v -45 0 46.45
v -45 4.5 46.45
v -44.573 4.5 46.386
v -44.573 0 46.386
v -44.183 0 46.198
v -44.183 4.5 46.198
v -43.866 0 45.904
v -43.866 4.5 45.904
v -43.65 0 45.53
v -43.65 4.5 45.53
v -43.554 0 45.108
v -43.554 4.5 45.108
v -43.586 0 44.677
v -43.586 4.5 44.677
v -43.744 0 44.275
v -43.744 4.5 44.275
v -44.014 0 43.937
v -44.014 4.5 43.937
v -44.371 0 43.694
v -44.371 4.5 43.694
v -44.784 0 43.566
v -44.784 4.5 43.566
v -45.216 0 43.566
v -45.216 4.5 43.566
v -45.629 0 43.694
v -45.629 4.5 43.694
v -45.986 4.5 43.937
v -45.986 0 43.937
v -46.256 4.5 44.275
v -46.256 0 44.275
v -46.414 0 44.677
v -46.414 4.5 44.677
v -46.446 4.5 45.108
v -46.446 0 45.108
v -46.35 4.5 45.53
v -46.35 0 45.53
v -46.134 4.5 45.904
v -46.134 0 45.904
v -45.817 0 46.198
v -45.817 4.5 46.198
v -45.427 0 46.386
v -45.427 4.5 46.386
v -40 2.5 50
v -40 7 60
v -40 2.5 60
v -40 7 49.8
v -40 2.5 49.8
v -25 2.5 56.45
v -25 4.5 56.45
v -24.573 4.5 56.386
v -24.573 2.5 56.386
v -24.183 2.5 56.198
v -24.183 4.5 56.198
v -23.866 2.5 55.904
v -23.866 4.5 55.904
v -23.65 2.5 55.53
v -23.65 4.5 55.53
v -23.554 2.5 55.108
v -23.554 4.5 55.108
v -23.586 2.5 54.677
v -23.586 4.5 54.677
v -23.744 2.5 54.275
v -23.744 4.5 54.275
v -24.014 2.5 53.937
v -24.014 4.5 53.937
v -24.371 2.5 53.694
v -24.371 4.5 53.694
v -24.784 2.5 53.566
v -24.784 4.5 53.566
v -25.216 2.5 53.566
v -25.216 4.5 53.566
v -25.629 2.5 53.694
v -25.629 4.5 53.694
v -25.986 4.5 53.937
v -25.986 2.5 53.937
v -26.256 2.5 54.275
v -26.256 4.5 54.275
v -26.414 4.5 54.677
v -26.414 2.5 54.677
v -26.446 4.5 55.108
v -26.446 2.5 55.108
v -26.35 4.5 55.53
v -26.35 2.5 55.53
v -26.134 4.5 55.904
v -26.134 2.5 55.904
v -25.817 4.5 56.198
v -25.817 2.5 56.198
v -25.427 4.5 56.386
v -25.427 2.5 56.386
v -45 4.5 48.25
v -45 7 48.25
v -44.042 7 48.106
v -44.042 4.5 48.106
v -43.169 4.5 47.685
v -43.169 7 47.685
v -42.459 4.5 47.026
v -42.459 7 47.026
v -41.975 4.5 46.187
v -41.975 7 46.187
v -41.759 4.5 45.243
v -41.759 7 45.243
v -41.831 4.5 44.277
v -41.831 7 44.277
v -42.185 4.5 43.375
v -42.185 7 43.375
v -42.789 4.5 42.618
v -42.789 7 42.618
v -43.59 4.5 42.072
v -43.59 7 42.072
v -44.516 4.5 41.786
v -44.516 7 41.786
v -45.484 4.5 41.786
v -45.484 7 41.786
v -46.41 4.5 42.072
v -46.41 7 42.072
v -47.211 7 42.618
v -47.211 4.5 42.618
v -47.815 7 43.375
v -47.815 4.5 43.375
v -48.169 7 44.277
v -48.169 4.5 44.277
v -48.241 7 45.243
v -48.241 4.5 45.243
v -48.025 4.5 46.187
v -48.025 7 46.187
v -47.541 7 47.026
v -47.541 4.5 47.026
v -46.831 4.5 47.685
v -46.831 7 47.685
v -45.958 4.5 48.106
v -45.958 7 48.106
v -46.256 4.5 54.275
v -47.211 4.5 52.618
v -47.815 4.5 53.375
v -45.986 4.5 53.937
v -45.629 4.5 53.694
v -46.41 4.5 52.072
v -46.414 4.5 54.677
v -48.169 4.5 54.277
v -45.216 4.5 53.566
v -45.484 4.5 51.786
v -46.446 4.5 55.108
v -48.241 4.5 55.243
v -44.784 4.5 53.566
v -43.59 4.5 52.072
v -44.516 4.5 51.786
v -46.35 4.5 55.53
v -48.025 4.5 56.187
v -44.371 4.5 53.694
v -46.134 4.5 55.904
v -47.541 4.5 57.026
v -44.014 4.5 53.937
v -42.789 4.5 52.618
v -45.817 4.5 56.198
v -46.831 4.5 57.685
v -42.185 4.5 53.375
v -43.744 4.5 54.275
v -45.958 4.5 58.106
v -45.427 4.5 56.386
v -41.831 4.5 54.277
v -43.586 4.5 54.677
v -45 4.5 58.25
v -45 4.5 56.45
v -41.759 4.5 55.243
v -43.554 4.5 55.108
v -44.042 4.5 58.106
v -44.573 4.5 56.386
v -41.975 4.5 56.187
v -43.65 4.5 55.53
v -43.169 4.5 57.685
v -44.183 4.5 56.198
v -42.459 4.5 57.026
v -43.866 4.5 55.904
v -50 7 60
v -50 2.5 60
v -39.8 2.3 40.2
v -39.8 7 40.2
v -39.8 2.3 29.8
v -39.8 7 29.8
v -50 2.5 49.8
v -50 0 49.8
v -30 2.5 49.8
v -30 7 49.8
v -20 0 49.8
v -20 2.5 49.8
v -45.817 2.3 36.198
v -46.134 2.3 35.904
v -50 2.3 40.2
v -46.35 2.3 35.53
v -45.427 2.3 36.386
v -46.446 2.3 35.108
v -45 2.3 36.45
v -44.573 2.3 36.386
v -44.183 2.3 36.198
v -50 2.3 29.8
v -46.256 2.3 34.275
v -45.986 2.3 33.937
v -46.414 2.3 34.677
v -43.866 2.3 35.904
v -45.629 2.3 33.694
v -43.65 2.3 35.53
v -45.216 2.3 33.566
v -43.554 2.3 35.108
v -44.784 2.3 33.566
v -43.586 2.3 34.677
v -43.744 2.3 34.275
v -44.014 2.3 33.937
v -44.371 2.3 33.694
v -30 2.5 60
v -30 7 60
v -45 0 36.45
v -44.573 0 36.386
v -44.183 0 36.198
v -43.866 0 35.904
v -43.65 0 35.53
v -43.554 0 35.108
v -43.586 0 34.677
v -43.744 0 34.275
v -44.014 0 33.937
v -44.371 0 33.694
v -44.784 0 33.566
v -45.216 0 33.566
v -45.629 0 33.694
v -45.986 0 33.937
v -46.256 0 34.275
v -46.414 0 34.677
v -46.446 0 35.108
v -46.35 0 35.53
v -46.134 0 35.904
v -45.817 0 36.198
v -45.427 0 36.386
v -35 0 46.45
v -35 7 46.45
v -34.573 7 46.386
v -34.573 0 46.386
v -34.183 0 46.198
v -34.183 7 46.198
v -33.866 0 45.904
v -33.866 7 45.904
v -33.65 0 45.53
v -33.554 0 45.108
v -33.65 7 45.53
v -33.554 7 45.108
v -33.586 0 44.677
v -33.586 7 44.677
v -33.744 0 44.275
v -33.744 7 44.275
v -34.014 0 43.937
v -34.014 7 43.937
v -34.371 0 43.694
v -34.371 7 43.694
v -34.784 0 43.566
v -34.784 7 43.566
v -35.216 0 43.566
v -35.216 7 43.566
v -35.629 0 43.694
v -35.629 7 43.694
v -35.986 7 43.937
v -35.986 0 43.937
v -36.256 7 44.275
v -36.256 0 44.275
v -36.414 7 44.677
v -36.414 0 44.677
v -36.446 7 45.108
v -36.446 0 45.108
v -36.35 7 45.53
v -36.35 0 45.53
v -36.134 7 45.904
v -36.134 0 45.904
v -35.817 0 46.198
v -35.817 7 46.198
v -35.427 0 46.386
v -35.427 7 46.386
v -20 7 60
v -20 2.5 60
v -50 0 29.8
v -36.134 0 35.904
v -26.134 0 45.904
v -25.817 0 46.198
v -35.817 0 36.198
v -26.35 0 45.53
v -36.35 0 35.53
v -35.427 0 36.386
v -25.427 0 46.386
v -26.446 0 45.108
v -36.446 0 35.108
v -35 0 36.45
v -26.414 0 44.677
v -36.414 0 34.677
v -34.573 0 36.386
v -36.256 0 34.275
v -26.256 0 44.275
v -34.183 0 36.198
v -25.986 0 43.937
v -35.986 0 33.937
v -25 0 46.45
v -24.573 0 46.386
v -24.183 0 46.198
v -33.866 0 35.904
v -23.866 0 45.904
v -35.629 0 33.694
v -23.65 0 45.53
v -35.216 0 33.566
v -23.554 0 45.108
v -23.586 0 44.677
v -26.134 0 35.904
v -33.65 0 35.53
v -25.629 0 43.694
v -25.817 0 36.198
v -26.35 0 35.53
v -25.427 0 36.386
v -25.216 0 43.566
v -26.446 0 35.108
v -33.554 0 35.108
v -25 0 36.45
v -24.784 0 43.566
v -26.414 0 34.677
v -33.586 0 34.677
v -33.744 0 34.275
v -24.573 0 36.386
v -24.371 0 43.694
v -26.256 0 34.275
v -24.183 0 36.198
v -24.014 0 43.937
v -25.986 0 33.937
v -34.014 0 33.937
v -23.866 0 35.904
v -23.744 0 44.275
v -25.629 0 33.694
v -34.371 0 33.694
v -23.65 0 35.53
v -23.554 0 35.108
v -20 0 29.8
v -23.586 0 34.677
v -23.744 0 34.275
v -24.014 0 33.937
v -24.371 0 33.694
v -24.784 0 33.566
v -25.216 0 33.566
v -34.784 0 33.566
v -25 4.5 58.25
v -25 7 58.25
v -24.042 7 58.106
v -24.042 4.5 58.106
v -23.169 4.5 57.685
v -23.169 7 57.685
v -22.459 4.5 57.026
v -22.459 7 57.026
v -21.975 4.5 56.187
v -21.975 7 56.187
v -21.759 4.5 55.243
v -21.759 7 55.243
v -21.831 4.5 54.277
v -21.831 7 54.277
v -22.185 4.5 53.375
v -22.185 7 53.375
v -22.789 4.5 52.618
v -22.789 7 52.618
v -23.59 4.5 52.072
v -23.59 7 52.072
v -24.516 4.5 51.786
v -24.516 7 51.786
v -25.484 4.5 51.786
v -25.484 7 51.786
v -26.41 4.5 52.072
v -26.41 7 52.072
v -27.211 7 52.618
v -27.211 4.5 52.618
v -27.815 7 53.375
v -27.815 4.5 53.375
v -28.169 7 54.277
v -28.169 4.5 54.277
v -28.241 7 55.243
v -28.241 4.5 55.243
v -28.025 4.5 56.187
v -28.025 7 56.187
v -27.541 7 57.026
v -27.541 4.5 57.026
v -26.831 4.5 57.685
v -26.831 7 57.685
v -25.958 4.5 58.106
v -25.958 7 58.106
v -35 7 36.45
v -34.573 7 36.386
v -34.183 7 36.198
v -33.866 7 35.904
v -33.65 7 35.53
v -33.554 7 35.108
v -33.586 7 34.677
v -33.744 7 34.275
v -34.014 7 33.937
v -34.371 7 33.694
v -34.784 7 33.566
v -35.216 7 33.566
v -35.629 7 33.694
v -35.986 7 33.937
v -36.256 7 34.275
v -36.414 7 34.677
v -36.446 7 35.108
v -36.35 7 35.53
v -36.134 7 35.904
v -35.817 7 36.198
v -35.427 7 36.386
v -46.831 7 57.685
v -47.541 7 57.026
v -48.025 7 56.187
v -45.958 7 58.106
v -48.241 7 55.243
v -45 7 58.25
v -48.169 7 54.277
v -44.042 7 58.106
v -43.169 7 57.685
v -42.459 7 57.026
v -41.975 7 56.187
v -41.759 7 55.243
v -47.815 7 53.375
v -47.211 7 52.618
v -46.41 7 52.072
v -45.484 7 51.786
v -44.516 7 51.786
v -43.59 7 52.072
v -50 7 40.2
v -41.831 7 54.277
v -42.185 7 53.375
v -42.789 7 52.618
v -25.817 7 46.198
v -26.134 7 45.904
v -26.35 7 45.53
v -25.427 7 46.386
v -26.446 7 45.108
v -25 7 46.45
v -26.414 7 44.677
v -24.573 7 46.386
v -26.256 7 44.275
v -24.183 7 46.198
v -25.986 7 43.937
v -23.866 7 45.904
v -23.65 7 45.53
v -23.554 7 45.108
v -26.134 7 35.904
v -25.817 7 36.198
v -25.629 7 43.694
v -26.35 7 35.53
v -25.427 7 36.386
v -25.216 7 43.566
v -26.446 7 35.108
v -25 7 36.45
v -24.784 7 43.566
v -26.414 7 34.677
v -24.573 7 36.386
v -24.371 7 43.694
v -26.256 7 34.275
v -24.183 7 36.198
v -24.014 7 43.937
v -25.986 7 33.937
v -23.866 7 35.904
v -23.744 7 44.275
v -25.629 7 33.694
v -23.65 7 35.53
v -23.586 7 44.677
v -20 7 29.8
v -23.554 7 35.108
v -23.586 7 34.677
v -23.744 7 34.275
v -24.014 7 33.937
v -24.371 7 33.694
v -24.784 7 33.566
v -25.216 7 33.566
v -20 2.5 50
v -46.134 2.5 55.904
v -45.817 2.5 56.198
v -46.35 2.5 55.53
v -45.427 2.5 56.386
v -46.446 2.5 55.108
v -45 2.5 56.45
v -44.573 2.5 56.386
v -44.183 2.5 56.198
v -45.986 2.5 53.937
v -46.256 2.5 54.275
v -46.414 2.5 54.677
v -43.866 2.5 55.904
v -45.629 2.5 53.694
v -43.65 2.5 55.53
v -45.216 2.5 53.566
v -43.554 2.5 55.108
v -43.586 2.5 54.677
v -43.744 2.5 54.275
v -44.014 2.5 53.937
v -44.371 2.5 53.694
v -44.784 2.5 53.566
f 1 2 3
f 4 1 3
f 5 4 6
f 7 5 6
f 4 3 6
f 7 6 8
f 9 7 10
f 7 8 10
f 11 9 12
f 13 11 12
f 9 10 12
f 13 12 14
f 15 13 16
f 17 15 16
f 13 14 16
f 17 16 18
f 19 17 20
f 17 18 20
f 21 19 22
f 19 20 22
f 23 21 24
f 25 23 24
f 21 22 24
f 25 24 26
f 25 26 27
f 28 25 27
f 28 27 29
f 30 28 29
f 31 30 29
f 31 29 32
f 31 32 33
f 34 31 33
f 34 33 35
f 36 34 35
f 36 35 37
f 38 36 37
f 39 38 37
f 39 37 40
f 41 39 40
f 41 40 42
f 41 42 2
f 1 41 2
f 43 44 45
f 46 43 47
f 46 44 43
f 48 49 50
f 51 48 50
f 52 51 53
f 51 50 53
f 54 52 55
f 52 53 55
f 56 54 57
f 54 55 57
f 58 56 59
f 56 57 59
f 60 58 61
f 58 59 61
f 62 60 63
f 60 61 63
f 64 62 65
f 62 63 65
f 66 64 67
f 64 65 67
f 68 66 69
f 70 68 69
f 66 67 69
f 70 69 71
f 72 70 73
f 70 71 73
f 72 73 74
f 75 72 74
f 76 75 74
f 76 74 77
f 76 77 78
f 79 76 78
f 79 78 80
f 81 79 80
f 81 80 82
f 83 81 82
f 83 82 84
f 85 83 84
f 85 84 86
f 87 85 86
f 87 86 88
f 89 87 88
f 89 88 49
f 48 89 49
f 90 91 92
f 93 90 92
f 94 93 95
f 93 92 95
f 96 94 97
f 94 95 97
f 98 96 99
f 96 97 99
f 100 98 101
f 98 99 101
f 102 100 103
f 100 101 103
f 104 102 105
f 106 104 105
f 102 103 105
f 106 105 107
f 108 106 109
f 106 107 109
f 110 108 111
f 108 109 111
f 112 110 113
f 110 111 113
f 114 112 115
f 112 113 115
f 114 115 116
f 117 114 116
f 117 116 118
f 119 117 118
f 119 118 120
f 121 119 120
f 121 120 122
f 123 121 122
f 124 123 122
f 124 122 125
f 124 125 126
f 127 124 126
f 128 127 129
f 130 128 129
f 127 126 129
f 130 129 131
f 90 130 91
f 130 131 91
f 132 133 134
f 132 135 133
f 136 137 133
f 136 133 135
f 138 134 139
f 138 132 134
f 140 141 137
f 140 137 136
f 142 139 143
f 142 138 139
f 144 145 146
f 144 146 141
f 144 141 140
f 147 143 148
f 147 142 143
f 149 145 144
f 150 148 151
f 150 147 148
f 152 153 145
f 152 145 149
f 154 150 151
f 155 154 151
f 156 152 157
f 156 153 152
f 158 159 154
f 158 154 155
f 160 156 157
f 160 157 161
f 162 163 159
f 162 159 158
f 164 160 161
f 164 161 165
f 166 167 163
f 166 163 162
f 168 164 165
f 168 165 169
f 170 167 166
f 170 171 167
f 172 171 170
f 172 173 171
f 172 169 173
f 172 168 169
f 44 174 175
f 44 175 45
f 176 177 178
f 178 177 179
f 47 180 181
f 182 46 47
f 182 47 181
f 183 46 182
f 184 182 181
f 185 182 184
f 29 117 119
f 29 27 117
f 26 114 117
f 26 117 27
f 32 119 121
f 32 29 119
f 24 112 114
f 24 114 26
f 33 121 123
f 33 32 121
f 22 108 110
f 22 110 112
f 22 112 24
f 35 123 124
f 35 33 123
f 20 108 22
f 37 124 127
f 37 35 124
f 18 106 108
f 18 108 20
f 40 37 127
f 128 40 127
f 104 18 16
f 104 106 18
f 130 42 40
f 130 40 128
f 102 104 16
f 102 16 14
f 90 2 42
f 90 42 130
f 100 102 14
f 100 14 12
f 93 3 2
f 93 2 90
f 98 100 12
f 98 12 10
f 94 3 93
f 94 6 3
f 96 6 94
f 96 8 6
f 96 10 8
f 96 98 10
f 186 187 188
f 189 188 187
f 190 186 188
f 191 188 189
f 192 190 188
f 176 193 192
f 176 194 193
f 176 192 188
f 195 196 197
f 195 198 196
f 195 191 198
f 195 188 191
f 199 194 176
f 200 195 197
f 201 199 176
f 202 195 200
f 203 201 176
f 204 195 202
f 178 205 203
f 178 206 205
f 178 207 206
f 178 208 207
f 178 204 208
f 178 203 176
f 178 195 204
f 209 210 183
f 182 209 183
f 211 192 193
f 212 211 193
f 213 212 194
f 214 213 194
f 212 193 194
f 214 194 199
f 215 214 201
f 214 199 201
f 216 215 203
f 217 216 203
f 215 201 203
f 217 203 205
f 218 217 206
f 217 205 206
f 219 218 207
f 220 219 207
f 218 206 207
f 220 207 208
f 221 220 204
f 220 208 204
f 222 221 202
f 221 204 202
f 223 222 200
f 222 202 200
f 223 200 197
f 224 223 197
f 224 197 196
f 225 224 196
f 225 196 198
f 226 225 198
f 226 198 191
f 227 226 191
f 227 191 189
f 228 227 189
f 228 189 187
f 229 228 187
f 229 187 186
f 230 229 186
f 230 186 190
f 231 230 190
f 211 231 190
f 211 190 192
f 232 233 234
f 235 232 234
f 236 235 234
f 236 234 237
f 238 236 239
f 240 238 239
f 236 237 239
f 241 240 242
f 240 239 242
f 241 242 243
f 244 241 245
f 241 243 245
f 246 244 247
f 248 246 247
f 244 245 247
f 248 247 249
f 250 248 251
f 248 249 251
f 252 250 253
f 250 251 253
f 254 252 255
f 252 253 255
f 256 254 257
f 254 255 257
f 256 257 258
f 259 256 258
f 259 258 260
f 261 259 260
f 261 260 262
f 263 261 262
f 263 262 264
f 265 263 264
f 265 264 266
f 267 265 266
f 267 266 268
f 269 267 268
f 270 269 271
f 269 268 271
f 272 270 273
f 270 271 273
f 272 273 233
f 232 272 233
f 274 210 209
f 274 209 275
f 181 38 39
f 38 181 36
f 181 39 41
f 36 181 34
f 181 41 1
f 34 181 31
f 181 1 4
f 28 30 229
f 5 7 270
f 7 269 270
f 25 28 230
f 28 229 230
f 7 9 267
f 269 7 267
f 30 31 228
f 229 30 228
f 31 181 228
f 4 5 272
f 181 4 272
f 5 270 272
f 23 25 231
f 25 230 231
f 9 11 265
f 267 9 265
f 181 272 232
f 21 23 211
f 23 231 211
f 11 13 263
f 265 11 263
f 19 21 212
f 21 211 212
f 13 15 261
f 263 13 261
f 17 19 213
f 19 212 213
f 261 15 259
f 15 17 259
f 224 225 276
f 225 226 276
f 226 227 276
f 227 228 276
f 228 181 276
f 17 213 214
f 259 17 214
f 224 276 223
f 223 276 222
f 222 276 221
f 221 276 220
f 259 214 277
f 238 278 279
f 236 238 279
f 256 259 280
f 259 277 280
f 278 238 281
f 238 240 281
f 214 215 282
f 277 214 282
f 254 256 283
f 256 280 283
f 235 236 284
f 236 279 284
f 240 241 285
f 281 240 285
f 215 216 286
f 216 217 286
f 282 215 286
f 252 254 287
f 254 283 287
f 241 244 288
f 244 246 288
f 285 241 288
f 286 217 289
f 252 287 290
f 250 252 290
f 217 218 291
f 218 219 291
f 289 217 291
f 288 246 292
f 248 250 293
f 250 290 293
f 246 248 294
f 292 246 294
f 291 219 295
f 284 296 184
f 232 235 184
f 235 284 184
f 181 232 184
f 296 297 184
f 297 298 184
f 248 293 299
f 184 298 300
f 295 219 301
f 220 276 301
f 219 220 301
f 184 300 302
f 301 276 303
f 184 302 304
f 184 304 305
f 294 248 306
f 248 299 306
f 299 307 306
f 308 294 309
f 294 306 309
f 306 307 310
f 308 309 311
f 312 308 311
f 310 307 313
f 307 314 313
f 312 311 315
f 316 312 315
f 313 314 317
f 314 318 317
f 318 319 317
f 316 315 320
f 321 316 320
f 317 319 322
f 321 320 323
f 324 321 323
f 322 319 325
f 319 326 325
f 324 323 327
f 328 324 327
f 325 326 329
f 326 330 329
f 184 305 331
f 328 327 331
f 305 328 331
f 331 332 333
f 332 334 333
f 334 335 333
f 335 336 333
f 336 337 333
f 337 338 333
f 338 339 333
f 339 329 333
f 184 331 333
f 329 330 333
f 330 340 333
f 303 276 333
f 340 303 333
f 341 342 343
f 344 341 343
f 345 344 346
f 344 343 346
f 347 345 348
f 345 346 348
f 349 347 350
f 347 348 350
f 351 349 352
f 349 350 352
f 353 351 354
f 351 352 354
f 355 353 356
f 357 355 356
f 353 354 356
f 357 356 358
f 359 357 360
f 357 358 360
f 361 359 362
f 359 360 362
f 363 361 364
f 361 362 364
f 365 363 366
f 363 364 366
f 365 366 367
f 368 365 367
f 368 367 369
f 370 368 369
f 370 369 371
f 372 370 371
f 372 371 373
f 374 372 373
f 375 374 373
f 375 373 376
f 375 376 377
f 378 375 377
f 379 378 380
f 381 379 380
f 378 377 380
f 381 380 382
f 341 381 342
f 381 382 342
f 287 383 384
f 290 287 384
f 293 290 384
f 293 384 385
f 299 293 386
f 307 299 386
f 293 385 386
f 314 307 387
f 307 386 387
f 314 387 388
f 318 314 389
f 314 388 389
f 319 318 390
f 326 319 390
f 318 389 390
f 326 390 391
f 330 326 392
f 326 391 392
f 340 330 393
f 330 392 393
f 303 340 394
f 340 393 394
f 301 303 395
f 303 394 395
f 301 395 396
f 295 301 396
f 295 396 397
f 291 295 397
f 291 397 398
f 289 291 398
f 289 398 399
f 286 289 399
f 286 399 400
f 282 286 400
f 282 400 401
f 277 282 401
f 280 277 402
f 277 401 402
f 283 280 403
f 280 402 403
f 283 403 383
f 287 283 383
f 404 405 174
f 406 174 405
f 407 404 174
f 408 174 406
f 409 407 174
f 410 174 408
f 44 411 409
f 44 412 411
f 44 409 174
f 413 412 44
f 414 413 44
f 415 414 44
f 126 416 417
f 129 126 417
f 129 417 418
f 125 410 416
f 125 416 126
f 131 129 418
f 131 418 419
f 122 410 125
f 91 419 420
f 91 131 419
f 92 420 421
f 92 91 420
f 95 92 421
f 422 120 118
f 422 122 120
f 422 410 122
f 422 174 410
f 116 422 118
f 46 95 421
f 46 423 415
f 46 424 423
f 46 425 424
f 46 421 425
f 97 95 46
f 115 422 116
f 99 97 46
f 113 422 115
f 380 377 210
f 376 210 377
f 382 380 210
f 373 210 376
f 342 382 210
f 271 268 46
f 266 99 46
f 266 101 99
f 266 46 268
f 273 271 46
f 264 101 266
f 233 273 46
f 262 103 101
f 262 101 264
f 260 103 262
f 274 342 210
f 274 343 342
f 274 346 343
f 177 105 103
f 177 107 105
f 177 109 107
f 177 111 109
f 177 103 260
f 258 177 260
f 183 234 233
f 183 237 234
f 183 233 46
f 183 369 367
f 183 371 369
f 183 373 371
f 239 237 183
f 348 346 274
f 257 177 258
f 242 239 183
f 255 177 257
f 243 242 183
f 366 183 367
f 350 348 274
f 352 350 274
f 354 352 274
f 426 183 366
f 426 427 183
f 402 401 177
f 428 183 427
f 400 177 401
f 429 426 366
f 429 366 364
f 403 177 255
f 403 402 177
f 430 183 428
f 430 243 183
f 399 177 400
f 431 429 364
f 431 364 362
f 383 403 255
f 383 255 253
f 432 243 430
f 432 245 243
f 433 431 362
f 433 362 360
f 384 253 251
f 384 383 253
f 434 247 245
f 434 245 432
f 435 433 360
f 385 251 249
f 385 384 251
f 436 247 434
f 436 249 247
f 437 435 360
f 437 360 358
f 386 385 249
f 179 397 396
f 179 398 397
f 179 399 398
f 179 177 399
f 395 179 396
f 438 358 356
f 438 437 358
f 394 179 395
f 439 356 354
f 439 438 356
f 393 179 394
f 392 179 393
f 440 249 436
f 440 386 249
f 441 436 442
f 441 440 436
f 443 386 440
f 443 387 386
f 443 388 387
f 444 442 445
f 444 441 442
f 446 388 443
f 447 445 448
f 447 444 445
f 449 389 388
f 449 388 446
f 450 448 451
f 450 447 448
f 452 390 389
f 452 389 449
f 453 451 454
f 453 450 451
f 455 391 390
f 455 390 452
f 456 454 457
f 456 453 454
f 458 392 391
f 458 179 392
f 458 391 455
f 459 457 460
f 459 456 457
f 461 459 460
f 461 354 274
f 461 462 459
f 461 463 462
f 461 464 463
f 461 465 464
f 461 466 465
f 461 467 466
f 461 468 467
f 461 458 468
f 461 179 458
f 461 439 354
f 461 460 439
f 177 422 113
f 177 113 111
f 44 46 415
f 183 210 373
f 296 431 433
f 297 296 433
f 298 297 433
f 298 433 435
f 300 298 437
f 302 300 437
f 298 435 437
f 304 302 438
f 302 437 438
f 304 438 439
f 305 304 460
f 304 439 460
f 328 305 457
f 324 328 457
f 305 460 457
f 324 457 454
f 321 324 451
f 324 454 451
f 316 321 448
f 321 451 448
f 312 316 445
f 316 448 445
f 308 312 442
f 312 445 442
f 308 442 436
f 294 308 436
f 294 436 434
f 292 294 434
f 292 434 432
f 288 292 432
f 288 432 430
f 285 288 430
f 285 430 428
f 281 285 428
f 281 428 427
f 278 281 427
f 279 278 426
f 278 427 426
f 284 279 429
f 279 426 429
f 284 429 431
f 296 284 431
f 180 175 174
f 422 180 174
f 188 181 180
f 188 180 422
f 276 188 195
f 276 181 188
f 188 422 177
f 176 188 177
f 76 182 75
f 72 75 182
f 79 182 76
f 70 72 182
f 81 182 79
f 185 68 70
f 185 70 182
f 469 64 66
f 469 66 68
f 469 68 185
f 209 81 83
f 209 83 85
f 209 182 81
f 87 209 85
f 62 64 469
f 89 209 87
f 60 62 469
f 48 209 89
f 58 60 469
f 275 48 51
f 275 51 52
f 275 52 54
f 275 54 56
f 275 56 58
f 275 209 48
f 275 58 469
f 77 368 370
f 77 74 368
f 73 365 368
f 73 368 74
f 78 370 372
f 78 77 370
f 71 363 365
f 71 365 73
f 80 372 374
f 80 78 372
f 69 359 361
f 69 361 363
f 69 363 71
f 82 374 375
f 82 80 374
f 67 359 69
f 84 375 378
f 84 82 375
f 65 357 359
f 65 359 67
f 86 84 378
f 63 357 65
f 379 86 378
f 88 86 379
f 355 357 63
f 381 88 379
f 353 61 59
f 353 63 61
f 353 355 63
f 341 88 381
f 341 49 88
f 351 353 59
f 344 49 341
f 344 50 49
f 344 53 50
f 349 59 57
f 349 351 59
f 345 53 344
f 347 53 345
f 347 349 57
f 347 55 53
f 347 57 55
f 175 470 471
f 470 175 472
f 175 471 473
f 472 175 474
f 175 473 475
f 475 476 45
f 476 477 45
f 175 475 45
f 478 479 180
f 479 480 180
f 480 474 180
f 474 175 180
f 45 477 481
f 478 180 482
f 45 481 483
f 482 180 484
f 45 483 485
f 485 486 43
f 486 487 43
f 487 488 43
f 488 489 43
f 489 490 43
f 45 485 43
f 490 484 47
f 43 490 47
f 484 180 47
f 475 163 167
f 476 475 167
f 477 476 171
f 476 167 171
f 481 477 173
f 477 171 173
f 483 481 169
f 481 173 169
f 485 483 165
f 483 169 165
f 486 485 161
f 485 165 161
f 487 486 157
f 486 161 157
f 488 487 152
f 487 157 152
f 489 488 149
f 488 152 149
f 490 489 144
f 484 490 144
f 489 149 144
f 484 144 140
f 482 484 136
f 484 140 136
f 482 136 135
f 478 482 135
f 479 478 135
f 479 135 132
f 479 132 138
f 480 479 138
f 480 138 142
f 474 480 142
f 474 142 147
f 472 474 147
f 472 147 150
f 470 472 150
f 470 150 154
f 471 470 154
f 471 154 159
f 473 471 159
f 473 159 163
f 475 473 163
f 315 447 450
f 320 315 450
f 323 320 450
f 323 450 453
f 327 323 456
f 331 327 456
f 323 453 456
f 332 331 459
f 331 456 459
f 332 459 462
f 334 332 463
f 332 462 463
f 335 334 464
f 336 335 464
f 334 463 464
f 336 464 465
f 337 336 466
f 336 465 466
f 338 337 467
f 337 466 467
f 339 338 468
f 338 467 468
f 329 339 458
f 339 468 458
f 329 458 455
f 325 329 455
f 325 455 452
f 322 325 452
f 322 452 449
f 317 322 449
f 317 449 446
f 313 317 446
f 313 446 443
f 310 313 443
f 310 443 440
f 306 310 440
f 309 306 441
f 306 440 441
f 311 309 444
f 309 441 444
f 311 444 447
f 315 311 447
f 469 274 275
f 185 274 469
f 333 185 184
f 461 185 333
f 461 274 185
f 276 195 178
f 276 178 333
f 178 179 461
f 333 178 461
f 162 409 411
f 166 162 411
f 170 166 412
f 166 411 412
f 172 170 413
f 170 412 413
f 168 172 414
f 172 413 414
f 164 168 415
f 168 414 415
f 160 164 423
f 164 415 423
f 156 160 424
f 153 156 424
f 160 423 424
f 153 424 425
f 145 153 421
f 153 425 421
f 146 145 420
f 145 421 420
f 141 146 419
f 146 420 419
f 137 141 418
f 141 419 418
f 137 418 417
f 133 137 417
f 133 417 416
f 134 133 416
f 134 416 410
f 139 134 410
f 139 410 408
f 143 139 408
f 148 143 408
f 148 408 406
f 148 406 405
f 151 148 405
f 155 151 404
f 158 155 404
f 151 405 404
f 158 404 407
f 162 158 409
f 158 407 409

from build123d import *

# Parameters (mm, degrees)
CROQUIS1_W              = 100
CROQUIS1_H              = 100
SALIENTE_EXTRUIR1_DEPTH = 7
CROQUIS2_W              = 10.4
CROQUIS2_H              = 10.4
CORTAR_EXTRUIR1_DEPTH   = 4.7
CROQUIS3_W              = 10
CROQUIS3_H              = 10
SALIENTE_EXTRUIR2_DEPTH = 4.5
CROQUIS4_R              = 1.45
CORTAR_EXTRUIR2_DEPTH   = 7
CROQUIS5_R              = 3.25
CORTAR_EXTRUIR4_DEPTH   = 2.5
CROQUIS6_W              = 10
CROQUIS6_H              = 0.2
CROQUIS6_W_2            = 0.2
CROQUIS6_H_2            = 9.8
CORTAR_EXTRUIR5_DEPTH   = 7
CROQUIS8_W              = 10.2
CROQUIS8_H              = 10
CORTAR_EXTRUIR7_DEPTH   = 7
CROQUIS9_W              = 10.012239445
CROQUIS9_H              = 0.2
CROQUIS9_W_2            = 0.2
CROQUIS9_H_2            = 10.2
CORTAR_EXTRUIR9_DEPTH   = 2.5
CROQUIS10_W             = 0.2
CROQUIS10_H             = 0.2
CORTAR_EXTRUIR11_DEPTH  = 5
CORTAR_EXTRUIR13_DEPTH  = 15


with BuildPart() as part:
    # Croquis1 → Saliente-Extruir1 (new body)
    with BuildSketch(Plane(origin=(0, 0, 0), x_dir=(1, 0, 0), z_dir=(0, 1, 0))):
        Rectangle(CROQUIS1_W, CROQUIS1_H)
    extrude(amount=SALIENTE_EXTRUIR1_DEPTH)

    # Croquis2 → Cortar-Extruir1 (cut)
    with BuildSketch(Plane(origin=(0, 7, 0), x_dir=(1, 0, 0), z_dir=(0, 1, 0))):
        with Locations((-45, 45)):
            Rectangle(CROQUIS2_W, CROQUIS2_H)
        with Locations((-25, 45)):
            Rectangle(CROQUIS2_W, CROQUIS2_H)
        with Locations((-5, 45)):
            Rectangle(CROQUIS2_W, CROQUIS2_H)
        with Locations((15, 45)):
            Rectangle(CROQUIS2_W, CROQUIS2_H)
        with Locations((35, 45)):
            Rectangle(CROQUIS2_W, CROQUIS2_H)
        with Locations((-45, 25)):
            Rectangle(CROQUIS2_W, CROQUIS2_H)
        with Locations((-45, 5)):
            Rectangle(CROQUIS2_W, CROQUIS2_H)
        with Locations((-45, -15)):
            Rectangle(CROQUIS2_W, CROQUIS2_H)
        with Locations((-45, -35)):
            Rectangle(CROQUIS2_W, CROQUIS2_H)
    extrude(amount=-CORTAR_EXTRUIR1_DEPTH, mode=Mode.SUBTRACT)

    # Croquis3 → Saliente-Extruir2 (add)
    with BuildSketch(Plane(origin=(0, 7, 0), x_dir=(1, 0, 0), z_dir=(0, 1, 0))):
        with Locations((55, 25)):
            Rectangle(CROQUIS3_W, CROQUIS3_H)
        with Locations((55, 45)):
            Rectangle(CROQUIS3_W, CROQUIS3_H)
        with Locations((55, 5)):
            Rectangle(CROQUIS3_W, CROQUIS3_H)
        with Locations((55, -15)):
            Rectangle(CROQUIS3_W, CROQUIS3_H)
        with Locations((55, -35)):
            Rectangle(CROQUIS3_W, CROQUIS3_H)
        with Locations((-25, -55)):
            Rectangle(CROQUIS3_W, CROQUIS3_H)
        with Locations((-45, -55)):
            Rectangle(CROQUIS3_W, CROQUIS3_H)
        with Locations((-5, -55)):
            Rectangle(CROQUIS3_W, CROQUIS3_H)
        with Locations((15, -55)):
            Rectangle(CROQUIS3_W, CROQUIS3_H)
        with Locations((35, -55)):
            Rectangle(CROQUIS3_W, CROQUIS3_H)
    extrude(amount=-SALIENTE_EXTRUIR2_DEPTH)

    # Croquis4 → Cortar-Extruir2 (cut)
    with BuildSketch(Plane(origin=(0, 7, 0), x_dir=(1, 0, 0), z_dir=(0, 1, 0))):
        with Locations(Location((-45, 45, 0), (0, 0, 270))):
            Circle(CROQUIS4_R)
        with Locations(Location((-35, 45, 0), (0, 0, 270))):
            Circle(CROQUIS4_R)
        with Locations(Location((-25, 45, 0), (0, 0, 270))):
            Circle(CROQUIS4_R)
        with Locations(Location((-15, 45, 0), (0, 0, 270))):
            Circle(CROQUIS4_R)
        with Locations(Location((-5, 45, 0), (0, 0, 270))):
            Circle(CROQUIS4_R)
        with Locations(Location((5, 45, 0), (0, 0, 270))):
            Circle(CROQUIS4_R)
        with Locations(Location((15, 45, 0), (0, 0, 270))):
            Circle(CROQUIS4_R)
        with Locations(Location((25, 45, 0), (0, 0, 270))):
            Circle(CROQUIS4_R)
        with Locations(Location((35, 45, 0), (0, 0, 270))):
            Circle(CROQUIS4_R)
        with Locations(Location((45, 45, 0), (0, 0, 270))):
            Circle(CROQUIS4_R)
        with Locations(Location((55, 45, 0), (0, 0, 270))):
            Circle(CROQUIS4_R)
        with Locations(Location((-35, 35, 0), (0, 0, 270))):
            Circle(CROQUIS4_R)
        with Locations(Location((-25, 35, 0), (0, 0, 270))):
            Circle(CROQUIS4_R)
        with Locations(Location((-15, 35, 0), (0, 0, 270))):
            Circle(CROQUIS4_R)
        with Locations(Location((-5, 35, 0), (0, 0, 270))):
            Circle(CROQUIS4_R)
        with Locations(Location((5, 35, 0), (0, 0, 270))):
            Circle(CROQUIS4_R)
        with Locations(Location((15, 35, 0), (0, 0, 270))):
            Circle(CROQUIS4_R)
        with Locations(Location((25, 35, 0), (0, 0, 270))):
            Circle(CROQUIS4_R)
        with Locations(Location((35, 35, 0), (0, 0, 270))):
            Circle(CROQUIS4_R)
        with Locations(Location((45, 35, 0), (0, 0, 270))):
            Circle(CROQUIS4_R)
        with Locations((55, 35)):
            Circle(CROQUIS4_R)
        with Locations(Location((-35, 25, 0), (0, 0, 270))):
            Circle(CROQUIS4_R)
        with Locations(Location((-25, 25, 0), (0, 0, 270))):
            Circle(CROQUIS4_R)
        with Locations(Location((-15, 25, 0), (0, 0, 270))):
            Circle(CROQUIS4_R)
        with Locations(Location((-5, 25, 0), (0, 0, 270))):
            Circle(CROQUIS4_R)
        with Locations(Location((5, 25, 0), (0, 0, 270))):
            Circle(CROQUIS4_R)
        with Locations(Location((15, 25, 0), (0, 0, 270))):
            Circle(CROQUIS4_R)
        with Locations(Location((25, 25, 0), (0, 0, 270))):
            Circle(CROQUIS4_R)
        with Locations(Location((35, 25, 0), (0, 0, 270))):
            Circle(CROQUIS4_R)
        with Locations(Location((45, 25, 0), (0, 0, 270))):
            Circle(CROQUIS4_R)
        with Locations(Location((55, 25, 0), (0, 0, 270))):
            Circle(CROQUIS4_R)
        with Locations(Location((-35, 15, 0), (0, 0, 270))):
            Circle(CROQUIS4_R)
        with Locations(Location((-25, 15, 0), (0, 0, 270))):
            Circle(CROQUIS4_R)
        with Locations(Location((-15, 15, 0), (0, 0, 270))):
            Circle(CROQUIS4_R)
        with Locations(Location((-5, 15, 0), (0, 0, 270))):
            Circle(CROQUIS4_R)
        with Locations(Location((5, 15, 0), (0, 0, 270))):
            Circle(CROQUIS4_R)
        with Locations(Location((15, 15, 0), (0, 0, 270))):
            Circle(CROQUIS4_R)
        with Locations(Location((25, 15, 0), (0, 0, 270))):
            Circle(CROQUIS4_R)
        with Locations(Location((35, 15, 0), (0, 0, 270))):
            Circle(CROQUIS4_R)
        with Locations(Location((45, 15, 0), (0, 0, 270))):
            Circle(CROQUIS4_R)
        with Locations((55, 15)):
            Circle(CROQUIS4_R)
        with Locations(Location((-35, 5, 0), (0, 0, 270))):
            Circle(CROQUIS4_R)
        with Locations(Location((-25, 5, 0), (0, 0, 270))):
            Circle(CROQUIS4_R)
        with Locations(Location((-15, 5, 0), (0, 0, 270))):
            Circle(CROQUIS4_R)
        with Locations(Location((-5, 5, 0), (0, 0, 270))):
            Circle(CROQUIS4_R)
        with Locations(Location((5, 5, 0), (0, 0, 270))):
            Circle(CROQUIS4_R)
        with Locations(Location((15, 5, 0), (0, 0, 270))):
            Circle(CROQUIS4_R)
        with Locations(Location((25, 5, 0), (0, 0, 270))):
            Circle(CROQUIS4_R)
        with Locations(Location((35, 5, 0), (0, 0, 270))):
            Circle(CROQUIS4_R)
        with Locations(Location((45, 5, 0), (0, 0, 270))):
            Circle(CROQUIS4_R)
        with Locations(Location((55, 5, 0), (0, 0, 270))):
            Circle(CROQUIS4_R)
        with Locations(Location((-35, -5, 0), (0, 0, 270))):
            Circle(CROQUIS4_R)
        with Locations(Location((-25, -5, 0), (0, 0, 270))):
            Circle(CROQUIS4_R)
        with Locations(Location((-15, -5, 0), (0, 0, 270))):
            Circle(CROQUIS4_R)
        with Locations(Location((-5, -5, 0), (0, 0, 270))):
            Circle(CROQUIS4_R)
        with Locations(Location((5, -5, 0), (0, 0, 270))):
            Circle(CROQUIS4_R)
        with Locations(Location((15, -5, 0), (0, 0, 270))):
            Circle(CROQUIS4_R)
        with Locations(Location((25, -5, 0), (0, 0, 270))):
            Circle(CROQUIS4_R)
        with Locations(Location((35, -5, 0), (0, 0, 270))):
            Circle(CROQUIS4_R)
        with Locations(Location((45, -5, 0), (0, 0, 270))):
            Circle(CROQUIS4_R)
        with Locations((55, -5)):
            Circle(CROQUIS4_R)
        with Locations(Location((-35, -15, 0), (0, 0, 270))):
            Circle(CROQUIS4_R)
        with Locations(Location((-25, -15, 0), (0, 0, 270))):
            Circle(CROQUIS4_R)
        with Locations(Location((-15, -15, 0), (0, 0, 270))):
            Circle(CROQUIS4_R)
        with Locations(Location((-5, -15, 0), (0, 0, 270))):
            Circle(CROQUIS4_R)
        with Locations(Location((5, -15, 0), (0, 0, 270))):
            Circle(CROQUIS4_R)
        with Locations(Location((15, -15, 0), (0, 0, 270))):
            Circle(CROQUIS4_R)
        with Locations(Location((25, -15, 0), (0, 0, 270))):
            Circle(CROQUIS4_R)
        with Locations(Location((35, -15, 0), (0, 0, 270))):
            Circle(CROQUIS4_R)
        with Locations(Location((45, -15, 0), (0, 0, 270))):
            Circle(CROQUIS4_R)
        with Locations(Location((55, -15, 0), (0, 0, 270))):
            Circle(CROQUIS4_R)
        with Locations(Location((-35, -25, 0), (0, 0, 270))):
            Circle(CROQUIS4_R)
        with Locations(Location((-25, -25, 0), (0, 0, 270))):
            Circle(CROQUIS4_R)
        with Locations(Location((-15, -25, 0), (0, 0, 270))):
            Circle(CROQUIS4_R)
        with Locations(Location((-5, -25, 0), (0, 0, 270))):
            Circle(CROQUIS4_R)
        with Locations(Location((5, -25, 0), (0, 0, 270))):
            Circle(CROQUIS4_R)
        with Locations(Location((15, -25, 0), (0, 0, 270))):
            Circle(CROQUIS4_R)
        with Locations(Location((25, -25, 0), (0, 0, 270))):
            Circle(CROQUIS4_R)
        with Locations(Location((35, -25, 0), (0, 0, 270))):
            Circle(CROQUIS4_R)
        with Locations(Location((45, -25, 0), (0, 0, 270))):
            Circle(CROQUIS4_R)
        with Locations((55, -25)):
            Circle(CROQUIS4_R)
        with Locations(Location((-35, -35, 0), (0, 0, 270))):
            Circle(CROQUIS4_R)
        with Locations(Location((-25, -35, 0), (0, 0, 270))):
            Circle(CROQUIS4_R)
        with Locations(Location((-15, -35, 0), (0, 0, 270))):
            Circle(CROQUIS4_R)
        with Locations(Location((-5, -35, 0), (0, 0, 270))):
            Circle(CROQUIS4_R)
        with Locations(Location((5, -35, 0), (0, 0, 270))):
            Circle(CROQUIS4_R)
        with Locations(Location((15, -35, 0), (0, 0, 270))):
            Circle(CROQUIS4_R)
        with Locations(Location((25, -35, 0), (0, 0, 270))):
            Circle(CROQUIS4_R)
        with Locations(Location((35, -35, 0), (0, 0, 270))):
            Circle(CROQUIS4_R)
        with Locations(Location((45, -35, 0), (0, 0, 270))):
            Circle(CROQUIS4_R)
        with Locations(Location((55, -35, 0), (0, 0, 270))):
            Circle(CROQUIS4_R)
        with Locations(Location((-35, -45, 0), (0, 0, 270))):
            Circle(CROQUIS4_R)
        with Locations(Location((-25, -45, 0), (0, 0, 270))):
            Circle(CROQUIS4_R)
        with Locations(Location((-15, -45, 0), (0, 0, 270))):
            Circle(CROQUIS4_R)
        with Locations(Location((-5, -45, 0), (0, 0, 270))):
            Circle(CROQUIS4_R)
        with Locations(Location((5, -45, 0), (0, 0, 270))):
            Circle(CROQUIS4_R)
        with Locations(Location((15, -45, 0), (0, 0, 270))):
            Circle(CROQUIS4_R)
        with Locations(Location((25, -45, 0), (0, 0, 270))):
            Circle(CROQUIS4_R)
        with Locations(Location((35, -45, 0), (0, 0, 270))):
            Circle(CROQUIS4_R)
        with Locations(Location((45, -45, 0), (0, 0, 270))):
            Circle(CROQUIS4_R)
        with Locations((55, -45)):
            Circle(CROQUIS4_R)
        with Locations((-35, -55)):
            Circle(CROQUIS4_R)
        with Locations(Location((-25, -55, 0), (0, 0, 270))):
            Circle(CROQUIS4_R)
        with Locations((-15, -55)):
            Circle(CROQUIS4_R)
        with Locations(Location((-5, -55, 0), (0, 0, 270))):
            Circle(CROQUIS4_R)
        with Locations((5, -55)):
            Circle(CROQUIS4_R)
        with Locations(Location((15, -55, 0), (0, 0, 270))):
            Circle(CROQUIS4_R)
        with Locations((25, -55)):
            Circle(CROQUIS4_R)
        with Locations(Location((35, -55, 0), (0, 0, 270))):
            Circle(CROQUIS4_R)
        with Locations((45, -55)):
            Circle(CROQUIS4_R)
        with Locations((55, -55)):
            Circle(CROQUIS4_R)
        with Locations(Location((-45, 35, 0), (0, 0, 270))):
            Circle(CROQUIS4_R)
        with Locations(Location((-45, 25, 0), (0, 0, 270))):
            Circle(CROQUIS4_R)
        with Locations(Location((-45, 15, 0), (0, 0, 270))):
            Circle(CROQUIS4_R)
        with Locations(Location((-45, 5, 0), (0, 0, 270))):
            Circle(CROQUIS4_R)
        with Locations(Location((-45, -5, 0), (0, 0, 270))):
            Circle(CROQUIS4_R)
        with Locations(Location((-45, -15, 0), (0, 0, 270))):
            Circle(CROQUIS4_R)
        with Locations(Location((-45, -25, 0), (0, 0, 270))):
            Circle(CROQUIS4_R)
        with Locations(Location((-45, -35, 0), (0, 0, 270))):
            Circle(CROQUIS4_R)
        with Locations(Location((-45, -45, 0), (0, 0, 270))):
            Circle(CROQUIS4_R)
        with Locations(Location((-45, -55, 0), (0, 0, 270))):
            Circle(CROQUIS4_R)
    extrude(amount=-CORTAR_EXTRUIR2_DEPTH, mode=Mode.SUBTRACT)

    # Croquis5 → Cortar-Extruir4 (cut)
    with BuildSketch(Plane(origin=(0, 7, 0), x_dir=(1, 0, 0), z_dir=(0, 1, 0))):
        with Locations((-45, 45)):
            Circle(CROQUIS5_R)
        with Locations(Location((-35, 45, 0), (0, 0, 270))):
            Circle(CROQUIS5_R)
        with Locations((-25, 45)):
            Circle(CROQUIS5_R)
        with Locations(Location((-15, 45, 0), (0, 0, 270))):
            Circle(CROQUIS5_R)
        with Locations((-5, 45)):
            Circle(CROQUIS5_R)
        with Locations(Location((5, 45, 0), (0, 0, 270))):
            Circle(CROQUIS5_R)
        with Locations((15, 45)):
            Circle(CROQUIS5_R)
        with Locations(Location((25, 45, 0), (0, 0, 270))):
            Circle(CROQUIS5_R)
        with Locations((35, 45)):
            Circle(CROQUIS5_R)
        with Locations(Location((45, 45, 0), (0, 0, 270))):
            Circle(CROQUIS5_R)
        with Locations(Location((55, 45, 0), (0, 0, 270))):
            Circle(CROQUIS5_R)
        with Locations((55, 35)):
            Circle(CROQUIS5_R)
        with Locations(Location((55, 25, 0), (0, 0, 270))):
            Circle(CROQUIS5_R)
        with Locations((55, 15)):
            Circle(CROQUIS5_R)
        with Locations(Location((55, 5, 0), (0, 0, 270))):
            Circle(CROQUIS5_R)
        with Locations((55, -5)):
            Circle(CROQUIS5_R)
        with Locations(Location((55, -15, 0), (0, 0, 270))):
            Circle(CROQUIS5_R)
        with Locations((55, -25)):
            Circle(CROQUIS5_R)
        with Locations(Location((55, -35, 0), (0, 0, 270))):
            Circle(CROQUIS5_R)
        with Locations((55, -45)):
            Circle(CROQUIS5_R)
        with Locations((-35, -55)):
            Circle(CROQUIS5_R)
        with Locations(Location((-25, -55, 0), (0, 0, 270))):
            Circle(CROQUIS5_R)
        with Locations((-15, -55)):
            Circle(CROQUIS5_R)
        with Locations(Location((-5, -55, 0), (0, 0, 270))):
            Circle(CROQUIS5_R)
        with Locations((5, -55)):
            Circle(CROQUIS5_R)
        with Locations(Location((15, -55, 0), (0, 0, 270))):
            Circle(CROQUIS5_R)
        with Locations((25, -55)):
            Circle(CROQUIS5_R)
        with Locations(Location((35, -55, 0), (0, 0, 270))):
            Circle(CROQUIS5_R)
        with Locations((45, -55)):
            Circle(CROQUIS5_R)
        with Locations((55, -55)):
            Circle(CROQUIS5_R)
        with Locations(Location((-45, 35, 0), (0, 0, 270))):
            Circle(CROQUIS5_R)
        with Locations((-45, 25)):
            Circle(CROQUIS5_R)
        with Locations(Location((-45, 15, 0), (0, 0, 270))):
            Circle(CROQUIS5_R)
        with Locations((-45, 5)):
            Circle(CROQUIS5_R)
        with Locations(Location((-45, -5, 0), (0, 0, 270))):
            Circle(CROQUIS5_R)
        with Locations((-45, -15)):
            Circle(CROQUIS5_R)
        with Locations(Location((-45, -25, 0), (0, 0, 270))):
            Circle(CROQUIS5_R)
        with Locations((-45, -35)):
            Circle(CROQUIS5_R)
        with Locations(Location((-45, -45, 0), (0, 0, 270))):
            Circle(CROQUIS5_R)
        with Locations(Location((-45, -55, 0), (0, 0, 270))):
            Circle(CROQUIS5_R)
    extrude(amount=-CORTAR_EXTRUIR4_DEPTH, mode=Mode.SUBTRACT)

    # Croquis6 → Cortar-Extruir5 (cut)
    with BuildSketch(Plane(origin=(0, 7, 0), x_dir=(1, 0, 0), z_dir=(0, 1, 0))):
        Polygon((50, -50), (40, -50), (40, -49.8), (49.8, -49.8), (49.8, -40), (50, -40), (50, -49.8), align=None)
        with Locations((25, -49.9)):
            Rectangle(CROQUIS6_W, CROQUIS6_H)
        with Locations((5, -49.9)):
            Rectangle(CROQUIS6_W, CROQUIS6_H)
        with Locations((-15, -49.9)):
            Rectangle(CROQUIS6_W, CROQUIS6_H)
        with Locations((-35, -49.9)):
            Rectangle(CROQUIS6_W, CROQUIS6_H)
        with Locations((49.9, -24.9)):
            Rectangle(CROQUIS6_W_2, CROQUIS6_H_2)
        with Locations((49.9, -4.9)):
            Rectangle(CROQUIS6_W_2, CROQUIS6_H_2)
        with Locations((49.9, 15.1)):
            Rectangle(CROQUIS6_W_2, CROQUIS6_H_2)
        with Locations((49.9, 35.1)):
            Rectangle(CROQUIS6_W_2, CROQUIS6_H_2)
    extrude(amount=-CORTAR_EXTRUIR5_DEPTH, mode=Mode.SUBTRACT)

    # Croquis8 → Cortar-Extruir7 (cut)
    with BuildSketch(Plane(origin=(0, 7, 0), x_dir=(1, 0, 0), z_dir=(0, 1, 0))):
        with Locations((54.9, 45)):
            Rectangle(CROQUIS8_W, CROQUIS8_H)
    extrude(amount=-CORTAR_EXTRUIR7_DEPTH, mode=Mode.SUBTRACT)

    # Croquis9 → Cortar-Extruir9 (cut)
    with BuildSketch(Plane.XZ):
        with Locations((-45.006119723, 49.9)):
            Rectangle(CROQUIS9_W, CROQUIS9_H)
        with Locations((-25.006119723, 49.9)):
            Rectangle(CROQUIS9_W, CROQUIS9_H)
        with Locations((-5.006119723, 49.9)):
            Rectangle(CROQUIS9_W, CROQUIS9_H)
        with Locations((14.993880278, 49.9)):
            Rectangle(CROQUIS9_W, CROQUIS9_H)
        with Locations((34.993880277, 49.9)):
            Rectangle(CROQUIS9_W, CROQUIS9_H)
        with Locations((49.9, -25.1)):
            Rectangle(CROQUIS9_W_2, CROQUIS9_H_2)
        with Locations((49.9, -5.1)):
            Rectangle(CROQUIS9_W_2, CROQUIS9_H_2)
        with Locations((49.9, 14.9)):
            Rectangle(CROQUIS9_W_2, CROQUIS9_H_2)
        with Locations((49.9, 34.9)):
            Rectangle(CROQUIS9_W_2, CROQUIS9_H_2)
    extrude(amount=-CORTAR_EXTRUIR9_DEPTH, mode=Mode.SUBTRACT)

    # Croquis10 → Cortar-Extruir11 (cut)
    with BuildSketch(Plane.XZ.offset(-2.5)):
        with Locations((49.9, 29.9)):
            Rectangle(CROQUIS10_W, CROQUIS10_H)
        with Locations((49.9, 9.9)):
            Rectangle(CROQUIS10_W, CROQUIS10_H)
        with Locations((49.9, -10.1)):
            Rectangle(CROQUIS10_W, CROQUIS10_H)
        with Locations((49.9, -30.1)):
            Rectangle(CROQUIS10_W, CROQUIS10_H)
    extrude(amount=-CORTAR_EXTRUIR11_DEPTH, mode=Mode.SUBTRACT)

    # Croquis11 → Cortar-Extruir13 (cut)
    with BuildSketch(Plane(origin=(0, 7, 0), x_dir=(1, 0, 0), z_dir=(0, 1, 0))):
        Polygon((-50, -29.8), (-20, -29.8), (-20, -60), (69.821086469, -60), (69.821086469, -29.8), (69.821086469, 55.315062569), (-50, 55.315062569), align=None)
    extrude(amount=-CORTAR_EXTRUIR13_DEPTH, mode=Mode.SUBTRACT)


solid = part.part
